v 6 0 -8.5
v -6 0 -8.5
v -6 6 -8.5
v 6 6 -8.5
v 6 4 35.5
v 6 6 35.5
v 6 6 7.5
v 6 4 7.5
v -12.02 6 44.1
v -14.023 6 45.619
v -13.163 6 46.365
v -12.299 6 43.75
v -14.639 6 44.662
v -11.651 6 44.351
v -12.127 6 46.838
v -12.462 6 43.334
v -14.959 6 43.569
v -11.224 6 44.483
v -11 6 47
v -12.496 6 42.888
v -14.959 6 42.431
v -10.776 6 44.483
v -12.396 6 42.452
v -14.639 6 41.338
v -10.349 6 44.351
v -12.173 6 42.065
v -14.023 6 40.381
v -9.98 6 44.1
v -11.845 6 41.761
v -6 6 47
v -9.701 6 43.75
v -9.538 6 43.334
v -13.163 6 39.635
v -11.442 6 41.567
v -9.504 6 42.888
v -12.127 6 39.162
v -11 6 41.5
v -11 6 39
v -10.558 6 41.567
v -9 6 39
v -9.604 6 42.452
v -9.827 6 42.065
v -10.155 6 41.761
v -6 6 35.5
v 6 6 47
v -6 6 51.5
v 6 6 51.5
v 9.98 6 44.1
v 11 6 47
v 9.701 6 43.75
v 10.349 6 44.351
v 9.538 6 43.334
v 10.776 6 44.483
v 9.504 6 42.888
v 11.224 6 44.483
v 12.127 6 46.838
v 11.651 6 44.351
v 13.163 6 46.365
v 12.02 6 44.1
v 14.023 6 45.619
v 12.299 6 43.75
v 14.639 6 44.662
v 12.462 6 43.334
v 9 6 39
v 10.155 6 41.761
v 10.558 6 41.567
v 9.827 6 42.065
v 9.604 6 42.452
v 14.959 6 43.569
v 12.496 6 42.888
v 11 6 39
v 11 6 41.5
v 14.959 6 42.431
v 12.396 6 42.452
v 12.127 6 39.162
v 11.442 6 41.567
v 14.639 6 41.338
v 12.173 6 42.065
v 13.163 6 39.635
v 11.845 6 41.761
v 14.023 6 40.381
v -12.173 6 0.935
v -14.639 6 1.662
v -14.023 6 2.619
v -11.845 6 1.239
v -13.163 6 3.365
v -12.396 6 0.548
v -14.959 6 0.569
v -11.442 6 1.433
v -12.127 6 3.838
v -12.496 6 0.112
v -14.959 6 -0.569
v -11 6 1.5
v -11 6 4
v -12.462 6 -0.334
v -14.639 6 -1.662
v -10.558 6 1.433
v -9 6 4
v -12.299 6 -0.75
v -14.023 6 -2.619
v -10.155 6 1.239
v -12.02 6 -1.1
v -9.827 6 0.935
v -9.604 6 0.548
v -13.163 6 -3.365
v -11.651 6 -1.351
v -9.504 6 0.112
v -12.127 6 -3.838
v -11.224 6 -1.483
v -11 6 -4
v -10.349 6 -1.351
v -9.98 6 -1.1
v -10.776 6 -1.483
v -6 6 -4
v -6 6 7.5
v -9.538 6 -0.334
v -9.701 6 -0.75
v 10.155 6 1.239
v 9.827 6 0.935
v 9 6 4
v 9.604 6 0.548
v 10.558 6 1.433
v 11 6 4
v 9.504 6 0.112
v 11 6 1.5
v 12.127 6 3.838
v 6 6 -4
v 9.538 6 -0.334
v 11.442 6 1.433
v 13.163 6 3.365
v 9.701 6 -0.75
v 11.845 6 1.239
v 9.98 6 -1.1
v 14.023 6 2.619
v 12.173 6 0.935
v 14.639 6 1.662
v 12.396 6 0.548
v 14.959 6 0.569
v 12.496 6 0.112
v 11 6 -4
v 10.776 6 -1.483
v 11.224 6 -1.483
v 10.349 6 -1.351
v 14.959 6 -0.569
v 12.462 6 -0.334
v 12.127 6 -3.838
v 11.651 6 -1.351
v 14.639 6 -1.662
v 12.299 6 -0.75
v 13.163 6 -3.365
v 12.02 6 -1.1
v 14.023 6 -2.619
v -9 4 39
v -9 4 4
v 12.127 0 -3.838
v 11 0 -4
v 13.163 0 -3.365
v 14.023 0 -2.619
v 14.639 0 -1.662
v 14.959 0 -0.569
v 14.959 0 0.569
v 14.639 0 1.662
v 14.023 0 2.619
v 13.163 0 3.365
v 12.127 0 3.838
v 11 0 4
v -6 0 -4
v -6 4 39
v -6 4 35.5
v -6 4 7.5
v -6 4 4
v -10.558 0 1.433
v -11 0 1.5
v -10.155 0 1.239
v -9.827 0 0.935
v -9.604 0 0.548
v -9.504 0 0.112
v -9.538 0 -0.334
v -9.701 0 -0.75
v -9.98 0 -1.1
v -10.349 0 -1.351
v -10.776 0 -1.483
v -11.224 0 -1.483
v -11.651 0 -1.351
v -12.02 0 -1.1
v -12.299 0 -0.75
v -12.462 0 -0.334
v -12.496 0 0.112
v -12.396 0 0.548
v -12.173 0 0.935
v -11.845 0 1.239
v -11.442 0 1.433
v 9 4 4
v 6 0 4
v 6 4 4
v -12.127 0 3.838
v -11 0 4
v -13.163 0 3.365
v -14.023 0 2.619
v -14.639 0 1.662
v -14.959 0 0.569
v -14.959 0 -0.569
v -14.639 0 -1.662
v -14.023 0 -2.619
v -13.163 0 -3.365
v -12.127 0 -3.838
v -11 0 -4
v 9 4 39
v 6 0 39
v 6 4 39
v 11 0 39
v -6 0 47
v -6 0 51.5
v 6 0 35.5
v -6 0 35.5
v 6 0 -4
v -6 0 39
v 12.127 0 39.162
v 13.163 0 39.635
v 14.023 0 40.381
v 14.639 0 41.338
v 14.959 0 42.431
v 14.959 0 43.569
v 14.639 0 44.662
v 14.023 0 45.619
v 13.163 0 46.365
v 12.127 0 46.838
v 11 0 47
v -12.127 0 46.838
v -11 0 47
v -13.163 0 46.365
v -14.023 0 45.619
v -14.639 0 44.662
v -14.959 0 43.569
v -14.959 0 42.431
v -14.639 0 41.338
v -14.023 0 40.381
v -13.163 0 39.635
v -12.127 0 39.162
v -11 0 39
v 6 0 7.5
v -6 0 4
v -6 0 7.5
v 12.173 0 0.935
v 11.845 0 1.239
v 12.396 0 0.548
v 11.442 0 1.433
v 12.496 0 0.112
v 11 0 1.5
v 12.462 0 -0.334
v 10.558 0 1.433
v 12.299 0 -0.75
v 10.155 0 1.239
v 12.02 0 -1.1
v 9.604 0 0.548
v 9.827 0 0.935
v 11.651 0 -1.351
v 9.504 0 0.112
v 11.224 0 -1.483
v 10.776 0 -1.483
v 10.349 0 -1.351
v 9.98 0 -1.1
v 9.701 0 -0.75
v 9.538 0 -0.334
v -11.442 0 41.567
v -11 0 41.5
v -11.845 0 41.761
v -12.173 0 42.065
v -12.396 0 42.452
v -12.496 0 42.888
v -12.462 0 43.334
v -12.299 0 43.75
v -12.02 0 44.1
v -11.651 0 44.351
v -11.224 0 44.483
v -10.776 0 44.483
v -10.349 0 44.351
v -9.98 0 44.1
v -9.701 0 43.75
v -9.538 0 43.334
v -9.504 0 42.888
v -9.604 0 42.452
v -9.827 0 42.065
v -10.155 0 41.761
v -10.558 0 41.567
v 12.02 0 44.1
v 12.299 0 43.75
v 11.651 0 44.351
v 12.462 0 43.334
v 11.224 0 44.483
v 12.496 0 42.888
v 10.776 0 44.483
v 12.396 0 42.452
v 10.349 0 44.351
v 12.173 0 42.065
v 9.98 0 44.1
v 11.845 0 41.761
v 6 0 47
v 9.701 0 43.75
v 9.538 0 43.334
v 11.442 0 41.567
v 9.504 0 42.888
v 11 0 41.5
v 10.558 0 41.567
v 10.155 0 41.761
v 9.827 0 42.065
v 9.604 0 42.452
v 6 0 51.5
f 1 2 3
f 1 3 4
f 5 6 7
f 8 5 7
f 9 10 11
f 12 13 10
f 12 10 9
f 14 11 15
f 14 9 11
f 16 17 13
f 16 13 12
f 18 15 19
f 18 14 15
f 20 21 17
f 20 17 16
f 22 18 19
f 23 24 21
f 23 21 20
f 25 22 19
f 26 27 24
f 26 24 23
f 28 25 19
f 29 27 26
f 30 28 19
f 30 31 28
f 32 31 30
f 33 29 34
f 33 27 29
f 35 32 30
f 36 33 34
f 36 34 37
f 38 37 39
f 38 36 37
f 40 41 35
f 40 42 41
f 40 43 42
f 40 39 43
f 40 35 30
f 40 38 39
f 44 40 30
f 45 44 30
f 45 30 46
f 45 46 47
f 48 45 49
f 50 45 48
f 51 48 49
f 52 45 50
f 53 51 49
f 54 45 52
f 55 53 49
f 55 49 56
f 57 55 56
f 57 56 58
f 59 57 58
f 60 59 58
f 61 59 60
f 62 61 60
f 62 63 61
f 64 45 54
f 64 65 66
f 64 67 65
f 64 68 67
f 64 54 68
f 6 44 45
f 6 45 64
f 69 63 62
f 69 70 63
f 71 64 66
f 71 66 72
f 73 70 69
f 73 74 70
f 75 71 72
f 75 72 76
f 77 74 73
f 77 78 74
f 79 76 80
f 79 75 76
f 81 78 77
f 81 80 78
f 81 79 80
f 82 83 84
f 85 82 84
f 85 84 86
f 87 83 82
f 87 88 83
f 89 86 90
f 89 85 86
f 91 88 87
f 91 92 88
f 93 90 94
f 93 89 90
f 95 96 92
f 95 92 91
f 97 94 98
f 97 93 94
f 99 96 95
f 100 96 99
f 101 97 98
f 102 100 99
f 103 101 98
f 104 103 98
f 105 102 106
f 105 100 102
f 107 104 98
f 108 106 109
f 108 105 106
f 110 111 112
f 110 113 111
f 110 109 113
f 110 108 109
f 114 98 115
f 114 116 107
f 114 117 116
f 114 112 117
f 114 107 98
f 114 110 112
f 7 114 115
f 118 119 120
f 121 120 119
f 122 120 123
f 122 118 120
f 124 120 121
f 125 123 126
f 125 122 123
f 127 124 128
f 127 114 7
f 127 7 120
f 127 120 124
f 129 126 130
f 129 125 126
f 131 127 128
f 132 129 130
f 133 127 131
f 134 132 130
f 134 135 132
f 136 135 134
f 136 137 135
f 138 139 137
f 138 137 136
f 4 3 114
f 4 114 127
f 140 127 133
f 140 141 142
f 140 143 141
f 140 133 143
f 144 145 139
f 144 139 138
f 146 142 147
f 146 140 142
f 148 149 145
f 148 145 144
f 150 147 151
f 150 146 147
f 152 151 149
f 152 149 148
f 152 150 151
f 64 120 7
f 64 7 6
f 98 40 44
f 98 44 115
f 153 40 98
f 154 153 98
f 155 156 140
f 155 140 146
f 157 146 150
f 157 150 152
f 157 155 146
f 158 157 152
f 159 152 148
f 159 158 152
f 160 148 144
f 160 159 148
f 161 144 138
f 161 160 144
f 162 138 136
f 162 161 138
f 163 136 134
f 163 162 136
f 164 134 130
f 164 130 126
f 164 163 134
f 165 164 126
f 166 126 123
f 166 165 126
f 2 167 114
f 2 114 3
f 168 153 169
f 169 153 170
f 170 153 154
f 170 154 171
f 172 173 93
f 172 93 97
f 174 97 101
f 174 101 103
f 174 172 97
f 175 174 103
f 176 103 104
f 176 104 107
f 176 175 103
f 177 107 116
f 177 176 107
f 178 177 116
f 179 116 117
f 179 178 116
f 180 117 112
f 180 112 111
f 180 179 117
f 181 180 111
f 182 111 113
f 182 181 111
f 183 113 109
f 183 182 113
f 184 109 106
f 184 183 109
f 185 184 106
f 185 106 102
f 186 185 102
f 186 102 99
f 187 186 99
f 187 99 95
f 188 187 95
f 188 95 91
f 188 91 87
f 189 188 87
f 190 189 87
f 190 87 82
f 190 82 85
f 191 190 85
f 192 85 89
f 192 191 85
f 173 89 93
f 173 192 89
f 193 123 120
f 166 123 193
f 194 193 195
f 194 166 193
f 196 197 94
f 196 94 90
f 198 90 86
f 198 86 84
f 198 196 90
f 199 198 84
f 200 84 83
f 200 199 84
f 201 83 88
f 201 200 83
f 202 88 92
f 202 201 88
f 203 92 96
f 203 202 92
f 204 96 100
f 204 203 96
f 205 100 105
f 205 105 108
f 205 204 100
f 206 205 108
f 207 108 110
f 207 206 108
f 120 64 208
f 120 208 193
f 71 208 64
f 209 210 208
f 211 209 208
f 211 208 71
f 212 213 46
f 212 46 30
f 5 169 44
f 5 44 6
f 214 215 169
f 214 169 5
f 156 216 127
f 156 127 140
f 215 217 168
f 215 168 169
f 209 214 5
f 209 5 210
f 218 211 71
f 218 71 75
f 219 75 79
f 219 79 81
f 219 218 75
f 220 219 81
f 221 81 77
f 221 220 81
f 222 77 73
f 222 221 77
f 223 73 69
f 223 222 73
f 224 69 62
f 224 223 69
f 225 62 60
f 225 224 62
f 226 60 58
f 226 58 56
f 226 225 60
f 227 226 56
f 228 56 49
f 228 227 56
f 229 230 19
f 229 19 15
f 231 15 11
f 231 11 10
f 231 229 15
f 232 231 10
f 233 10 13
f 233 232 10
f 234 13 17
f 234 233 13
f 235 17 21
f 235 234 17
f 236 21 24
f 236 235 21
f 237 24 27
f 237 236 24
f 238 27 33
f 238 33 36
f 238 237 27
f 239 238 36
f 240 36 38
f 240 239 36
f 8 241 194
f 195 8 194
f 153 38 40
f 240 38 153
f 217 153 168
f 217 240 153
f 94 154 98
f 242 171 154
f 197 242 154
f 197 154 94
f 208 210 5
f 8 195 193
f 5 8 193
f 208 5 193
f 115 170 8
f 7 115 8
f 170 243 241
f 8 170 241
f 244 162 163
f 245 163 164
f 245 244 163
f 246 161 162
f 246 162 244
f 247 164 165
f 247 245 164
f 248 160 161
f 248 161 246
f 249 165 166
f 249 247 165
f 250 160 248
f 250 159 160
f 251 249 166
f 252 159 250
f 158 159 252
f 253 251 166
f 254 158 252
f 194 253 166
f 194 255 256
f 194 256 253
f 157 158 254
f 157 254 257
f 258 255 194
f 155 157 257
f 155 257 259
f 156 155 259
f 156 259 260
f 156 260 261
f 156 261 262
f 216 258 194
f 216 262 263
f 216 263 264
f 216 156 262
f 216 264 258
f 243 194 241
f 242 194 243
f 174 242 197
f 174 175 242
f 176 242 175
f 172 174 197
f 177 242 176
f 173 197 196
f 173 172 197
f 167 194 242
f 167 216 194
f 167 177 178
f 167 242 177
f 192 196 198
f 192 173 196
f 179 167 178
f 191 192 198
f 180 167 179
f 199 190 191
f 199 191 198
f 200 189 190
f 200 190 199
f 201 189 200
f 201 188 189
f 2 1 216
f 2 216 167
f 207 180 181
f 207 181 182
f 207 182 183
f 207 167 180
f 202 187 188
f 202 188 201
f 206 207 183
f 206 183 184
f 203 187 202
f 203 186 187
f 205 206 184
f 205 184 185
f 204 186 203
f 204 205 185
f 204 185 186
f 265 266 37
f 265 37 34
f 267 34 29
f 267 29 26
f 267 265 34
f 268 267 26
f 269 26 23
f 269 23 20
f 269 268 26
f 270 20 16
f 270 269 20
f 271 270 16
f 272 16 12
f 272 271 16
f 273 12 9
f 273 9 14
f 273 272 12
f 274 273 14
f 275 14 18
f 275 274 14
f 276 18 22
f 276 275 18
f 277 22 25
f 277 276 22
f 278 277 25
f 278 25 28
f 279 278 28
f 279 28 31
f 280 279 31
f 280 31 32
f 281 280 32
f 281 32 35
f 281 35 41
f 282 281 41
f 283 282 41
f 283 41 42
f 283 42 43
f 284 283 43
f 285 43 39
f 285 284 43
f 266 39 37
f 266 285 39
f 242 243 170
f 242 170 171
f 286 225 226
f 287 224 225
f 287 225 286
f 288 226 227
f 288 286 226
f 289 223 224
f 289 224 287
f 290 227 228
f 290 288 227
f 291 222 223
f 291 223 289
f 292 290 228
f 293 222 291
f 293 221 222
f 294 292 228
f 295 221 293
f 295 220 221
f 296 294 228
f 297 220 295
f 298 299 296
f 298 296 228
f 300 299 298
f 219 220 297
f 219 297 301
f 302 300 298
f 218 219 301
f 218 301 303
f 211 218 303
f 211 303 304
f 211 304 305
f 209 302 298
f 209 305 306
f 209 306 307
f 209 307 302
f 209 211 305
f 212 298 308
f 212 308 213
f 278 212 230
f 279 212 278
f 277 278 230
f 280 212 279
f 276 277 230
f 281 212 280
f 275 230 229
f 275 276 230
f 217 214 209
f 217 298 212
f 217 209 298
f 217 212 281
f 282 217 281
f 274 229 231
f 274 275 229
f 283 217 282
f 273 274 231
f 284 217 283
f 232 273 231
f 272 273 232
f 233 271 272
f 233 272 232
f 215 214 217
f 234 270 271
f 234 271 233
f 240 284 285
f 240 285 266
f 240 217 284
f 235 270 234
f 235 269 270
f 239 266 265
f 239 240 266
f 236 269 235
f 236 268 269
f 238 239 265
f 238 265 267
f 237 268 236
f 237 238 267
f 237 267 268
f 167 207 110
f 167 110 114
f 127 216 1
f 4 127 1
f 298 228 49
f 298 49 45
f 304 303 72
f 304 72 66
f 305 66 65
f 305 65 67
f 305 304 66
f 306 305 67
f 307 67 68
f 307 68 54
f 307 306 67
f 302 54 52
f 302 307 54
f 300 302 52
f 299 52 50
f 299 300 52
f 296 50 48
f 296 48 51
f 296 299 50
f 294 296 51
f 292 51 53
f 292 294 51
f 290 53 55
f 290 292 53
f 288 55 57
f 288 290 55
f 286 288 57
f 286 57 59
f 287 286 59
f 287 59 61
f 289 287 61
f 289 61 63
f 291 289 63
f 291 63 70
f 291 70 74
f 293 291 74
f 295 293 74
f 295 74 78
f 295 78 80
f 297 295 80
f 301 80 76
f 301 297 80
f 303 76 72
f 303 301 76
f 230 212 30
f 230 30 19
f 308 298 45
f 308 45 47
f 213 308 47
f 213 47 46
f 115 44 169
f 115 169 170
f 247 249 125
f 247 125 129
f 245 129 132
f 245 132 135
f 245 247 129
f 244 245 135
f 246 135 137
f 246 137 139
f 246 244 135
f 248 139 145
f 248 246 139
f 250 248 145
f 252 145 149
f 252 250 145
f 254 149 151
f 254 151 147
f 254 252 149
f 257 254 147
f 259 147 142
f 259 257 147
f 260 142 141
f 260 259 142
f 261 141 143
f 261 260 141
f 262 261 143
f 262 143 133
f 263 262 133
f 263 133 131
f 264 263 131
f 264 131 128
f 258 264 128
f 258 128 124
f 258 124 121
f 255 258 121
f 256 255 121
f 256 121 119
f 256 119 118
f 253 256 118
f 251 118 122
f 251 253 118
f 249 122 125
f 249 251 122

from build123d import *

# Parameters (mm, degrees)
SKETCH1_R           = 1.5
SKETCH1_W           = 12
SKETCH1_H           = 4.5
SKETCH1_H_2         = 3.5
BOSS_EXTRUDE1_DEPTH = 6
SKETCH3_W           = 3
SKETCH3_H           = 35
BOSS_EXTRUDE2_DEPTH = 2


with BuildPart() as part:
    # Sketch1 → Boss-Extrude1 (new body)
    # profile 1 of 4: a face of its own
    with BuildSketch(Plane(origin=(0, 0, 0), x_dir=(1, 0, 0), z_dir=(0, 1, 0))):
        with BuildLine():
            Line((11, -4), (-11, -4))
            ThreePointArc((-11, -4), (-15, 0), (-11, 4))
            Line((-11, 4), (11, 4))
            ThreePointArc((11, 4), (15, 0), (11, -4))
        make_face()
        with Locations(Location((11, 0, 0), (0, 0, 270))):
            Circle(SKETCH1_R, mode=Mode.SUBTRACT)
        with Locations(Location((-11, 0, 0), (0, 0, 270))):
            Circle(SKETCH1_R, mode=Mode.SUBTRACT)
    # profile 2 of 4: a face of its own
    with BuildSketch(Plane(origin=(0, 0, 0), x_dir=(1, 0, 0), z_dir=(0, 1, 0))):
        with Locations((0, 6.25)):
            Rectangle(SKETCH1_W, SKETCH1_H)
    # profile 3 of 4: a face of its own
    with BuildSketch(Plane(origin=(0, 0, 0), x_dir=(1, 0, 0), z_dir=(0, 1, 0))):
        with Locations((0, -5.75)):
            Rectangle(SKETCH1_W, SKETCH1_H_2)
    # profile 4 of 4: a face of its own
    with BuildSketch(Plane(origin=(0, 0, 0), x_dir=(1, 0, 0), z_dir=(0, 1, 0))):
        with BuildLine():
            Line((6, -47), (6, -51.5))
            Line((6, -51.5), (-6, -51.5))
            Line((-6, -51.5), (-6, -47))
            Line((-6, -47), (-11, -47))
            ThreePointArc((-11, -47), (-15, -43), (-11, -39))
            Line((-11, -39), (-6, -39))
            Line((-6, -39), (-6, -35.5))
            Line((-6, -35.5), (6, -35.5))
            Line((6, -35.5), (6, -39))
            Line((6, -39), (11, -39))
            ThreePointArc((11, -39), (15, -43), (11, -47))
            Line((11, -47), (6, -47))
        make_face()
        with Locations(Location((-11, -43, 0), (0, 0, 90))):
            Circle(SKETCH1_R, mode=Mode.SUBTRACT)
        with Locations(Location((11, -43, 0), (0, 0, 90))):
            Circle(SKETCH1_R, mode=Mode.SUBTRACT)
    extrude(amount=BOSS_EXTRUDE1_DEPTH)

    # Sketch3 → Boss-Extrude2 (add)
    with BuildSketch(Plane(origin=(0, 6, 0), x_dir=(1, 0, 0), z_dir=(0, 1, 0))):
        with Locations((7.5, -21.5)):
            Rectangle(SKETCH3_W, SKETCH3_H)
        with Locations((-7.5, -21.5)):
            Rectangle(SKETCH3_W, SKETCH3_H)
    extrude(amount=-BOSS_EXTRUDE2_DEPTH)


solid = part.part
